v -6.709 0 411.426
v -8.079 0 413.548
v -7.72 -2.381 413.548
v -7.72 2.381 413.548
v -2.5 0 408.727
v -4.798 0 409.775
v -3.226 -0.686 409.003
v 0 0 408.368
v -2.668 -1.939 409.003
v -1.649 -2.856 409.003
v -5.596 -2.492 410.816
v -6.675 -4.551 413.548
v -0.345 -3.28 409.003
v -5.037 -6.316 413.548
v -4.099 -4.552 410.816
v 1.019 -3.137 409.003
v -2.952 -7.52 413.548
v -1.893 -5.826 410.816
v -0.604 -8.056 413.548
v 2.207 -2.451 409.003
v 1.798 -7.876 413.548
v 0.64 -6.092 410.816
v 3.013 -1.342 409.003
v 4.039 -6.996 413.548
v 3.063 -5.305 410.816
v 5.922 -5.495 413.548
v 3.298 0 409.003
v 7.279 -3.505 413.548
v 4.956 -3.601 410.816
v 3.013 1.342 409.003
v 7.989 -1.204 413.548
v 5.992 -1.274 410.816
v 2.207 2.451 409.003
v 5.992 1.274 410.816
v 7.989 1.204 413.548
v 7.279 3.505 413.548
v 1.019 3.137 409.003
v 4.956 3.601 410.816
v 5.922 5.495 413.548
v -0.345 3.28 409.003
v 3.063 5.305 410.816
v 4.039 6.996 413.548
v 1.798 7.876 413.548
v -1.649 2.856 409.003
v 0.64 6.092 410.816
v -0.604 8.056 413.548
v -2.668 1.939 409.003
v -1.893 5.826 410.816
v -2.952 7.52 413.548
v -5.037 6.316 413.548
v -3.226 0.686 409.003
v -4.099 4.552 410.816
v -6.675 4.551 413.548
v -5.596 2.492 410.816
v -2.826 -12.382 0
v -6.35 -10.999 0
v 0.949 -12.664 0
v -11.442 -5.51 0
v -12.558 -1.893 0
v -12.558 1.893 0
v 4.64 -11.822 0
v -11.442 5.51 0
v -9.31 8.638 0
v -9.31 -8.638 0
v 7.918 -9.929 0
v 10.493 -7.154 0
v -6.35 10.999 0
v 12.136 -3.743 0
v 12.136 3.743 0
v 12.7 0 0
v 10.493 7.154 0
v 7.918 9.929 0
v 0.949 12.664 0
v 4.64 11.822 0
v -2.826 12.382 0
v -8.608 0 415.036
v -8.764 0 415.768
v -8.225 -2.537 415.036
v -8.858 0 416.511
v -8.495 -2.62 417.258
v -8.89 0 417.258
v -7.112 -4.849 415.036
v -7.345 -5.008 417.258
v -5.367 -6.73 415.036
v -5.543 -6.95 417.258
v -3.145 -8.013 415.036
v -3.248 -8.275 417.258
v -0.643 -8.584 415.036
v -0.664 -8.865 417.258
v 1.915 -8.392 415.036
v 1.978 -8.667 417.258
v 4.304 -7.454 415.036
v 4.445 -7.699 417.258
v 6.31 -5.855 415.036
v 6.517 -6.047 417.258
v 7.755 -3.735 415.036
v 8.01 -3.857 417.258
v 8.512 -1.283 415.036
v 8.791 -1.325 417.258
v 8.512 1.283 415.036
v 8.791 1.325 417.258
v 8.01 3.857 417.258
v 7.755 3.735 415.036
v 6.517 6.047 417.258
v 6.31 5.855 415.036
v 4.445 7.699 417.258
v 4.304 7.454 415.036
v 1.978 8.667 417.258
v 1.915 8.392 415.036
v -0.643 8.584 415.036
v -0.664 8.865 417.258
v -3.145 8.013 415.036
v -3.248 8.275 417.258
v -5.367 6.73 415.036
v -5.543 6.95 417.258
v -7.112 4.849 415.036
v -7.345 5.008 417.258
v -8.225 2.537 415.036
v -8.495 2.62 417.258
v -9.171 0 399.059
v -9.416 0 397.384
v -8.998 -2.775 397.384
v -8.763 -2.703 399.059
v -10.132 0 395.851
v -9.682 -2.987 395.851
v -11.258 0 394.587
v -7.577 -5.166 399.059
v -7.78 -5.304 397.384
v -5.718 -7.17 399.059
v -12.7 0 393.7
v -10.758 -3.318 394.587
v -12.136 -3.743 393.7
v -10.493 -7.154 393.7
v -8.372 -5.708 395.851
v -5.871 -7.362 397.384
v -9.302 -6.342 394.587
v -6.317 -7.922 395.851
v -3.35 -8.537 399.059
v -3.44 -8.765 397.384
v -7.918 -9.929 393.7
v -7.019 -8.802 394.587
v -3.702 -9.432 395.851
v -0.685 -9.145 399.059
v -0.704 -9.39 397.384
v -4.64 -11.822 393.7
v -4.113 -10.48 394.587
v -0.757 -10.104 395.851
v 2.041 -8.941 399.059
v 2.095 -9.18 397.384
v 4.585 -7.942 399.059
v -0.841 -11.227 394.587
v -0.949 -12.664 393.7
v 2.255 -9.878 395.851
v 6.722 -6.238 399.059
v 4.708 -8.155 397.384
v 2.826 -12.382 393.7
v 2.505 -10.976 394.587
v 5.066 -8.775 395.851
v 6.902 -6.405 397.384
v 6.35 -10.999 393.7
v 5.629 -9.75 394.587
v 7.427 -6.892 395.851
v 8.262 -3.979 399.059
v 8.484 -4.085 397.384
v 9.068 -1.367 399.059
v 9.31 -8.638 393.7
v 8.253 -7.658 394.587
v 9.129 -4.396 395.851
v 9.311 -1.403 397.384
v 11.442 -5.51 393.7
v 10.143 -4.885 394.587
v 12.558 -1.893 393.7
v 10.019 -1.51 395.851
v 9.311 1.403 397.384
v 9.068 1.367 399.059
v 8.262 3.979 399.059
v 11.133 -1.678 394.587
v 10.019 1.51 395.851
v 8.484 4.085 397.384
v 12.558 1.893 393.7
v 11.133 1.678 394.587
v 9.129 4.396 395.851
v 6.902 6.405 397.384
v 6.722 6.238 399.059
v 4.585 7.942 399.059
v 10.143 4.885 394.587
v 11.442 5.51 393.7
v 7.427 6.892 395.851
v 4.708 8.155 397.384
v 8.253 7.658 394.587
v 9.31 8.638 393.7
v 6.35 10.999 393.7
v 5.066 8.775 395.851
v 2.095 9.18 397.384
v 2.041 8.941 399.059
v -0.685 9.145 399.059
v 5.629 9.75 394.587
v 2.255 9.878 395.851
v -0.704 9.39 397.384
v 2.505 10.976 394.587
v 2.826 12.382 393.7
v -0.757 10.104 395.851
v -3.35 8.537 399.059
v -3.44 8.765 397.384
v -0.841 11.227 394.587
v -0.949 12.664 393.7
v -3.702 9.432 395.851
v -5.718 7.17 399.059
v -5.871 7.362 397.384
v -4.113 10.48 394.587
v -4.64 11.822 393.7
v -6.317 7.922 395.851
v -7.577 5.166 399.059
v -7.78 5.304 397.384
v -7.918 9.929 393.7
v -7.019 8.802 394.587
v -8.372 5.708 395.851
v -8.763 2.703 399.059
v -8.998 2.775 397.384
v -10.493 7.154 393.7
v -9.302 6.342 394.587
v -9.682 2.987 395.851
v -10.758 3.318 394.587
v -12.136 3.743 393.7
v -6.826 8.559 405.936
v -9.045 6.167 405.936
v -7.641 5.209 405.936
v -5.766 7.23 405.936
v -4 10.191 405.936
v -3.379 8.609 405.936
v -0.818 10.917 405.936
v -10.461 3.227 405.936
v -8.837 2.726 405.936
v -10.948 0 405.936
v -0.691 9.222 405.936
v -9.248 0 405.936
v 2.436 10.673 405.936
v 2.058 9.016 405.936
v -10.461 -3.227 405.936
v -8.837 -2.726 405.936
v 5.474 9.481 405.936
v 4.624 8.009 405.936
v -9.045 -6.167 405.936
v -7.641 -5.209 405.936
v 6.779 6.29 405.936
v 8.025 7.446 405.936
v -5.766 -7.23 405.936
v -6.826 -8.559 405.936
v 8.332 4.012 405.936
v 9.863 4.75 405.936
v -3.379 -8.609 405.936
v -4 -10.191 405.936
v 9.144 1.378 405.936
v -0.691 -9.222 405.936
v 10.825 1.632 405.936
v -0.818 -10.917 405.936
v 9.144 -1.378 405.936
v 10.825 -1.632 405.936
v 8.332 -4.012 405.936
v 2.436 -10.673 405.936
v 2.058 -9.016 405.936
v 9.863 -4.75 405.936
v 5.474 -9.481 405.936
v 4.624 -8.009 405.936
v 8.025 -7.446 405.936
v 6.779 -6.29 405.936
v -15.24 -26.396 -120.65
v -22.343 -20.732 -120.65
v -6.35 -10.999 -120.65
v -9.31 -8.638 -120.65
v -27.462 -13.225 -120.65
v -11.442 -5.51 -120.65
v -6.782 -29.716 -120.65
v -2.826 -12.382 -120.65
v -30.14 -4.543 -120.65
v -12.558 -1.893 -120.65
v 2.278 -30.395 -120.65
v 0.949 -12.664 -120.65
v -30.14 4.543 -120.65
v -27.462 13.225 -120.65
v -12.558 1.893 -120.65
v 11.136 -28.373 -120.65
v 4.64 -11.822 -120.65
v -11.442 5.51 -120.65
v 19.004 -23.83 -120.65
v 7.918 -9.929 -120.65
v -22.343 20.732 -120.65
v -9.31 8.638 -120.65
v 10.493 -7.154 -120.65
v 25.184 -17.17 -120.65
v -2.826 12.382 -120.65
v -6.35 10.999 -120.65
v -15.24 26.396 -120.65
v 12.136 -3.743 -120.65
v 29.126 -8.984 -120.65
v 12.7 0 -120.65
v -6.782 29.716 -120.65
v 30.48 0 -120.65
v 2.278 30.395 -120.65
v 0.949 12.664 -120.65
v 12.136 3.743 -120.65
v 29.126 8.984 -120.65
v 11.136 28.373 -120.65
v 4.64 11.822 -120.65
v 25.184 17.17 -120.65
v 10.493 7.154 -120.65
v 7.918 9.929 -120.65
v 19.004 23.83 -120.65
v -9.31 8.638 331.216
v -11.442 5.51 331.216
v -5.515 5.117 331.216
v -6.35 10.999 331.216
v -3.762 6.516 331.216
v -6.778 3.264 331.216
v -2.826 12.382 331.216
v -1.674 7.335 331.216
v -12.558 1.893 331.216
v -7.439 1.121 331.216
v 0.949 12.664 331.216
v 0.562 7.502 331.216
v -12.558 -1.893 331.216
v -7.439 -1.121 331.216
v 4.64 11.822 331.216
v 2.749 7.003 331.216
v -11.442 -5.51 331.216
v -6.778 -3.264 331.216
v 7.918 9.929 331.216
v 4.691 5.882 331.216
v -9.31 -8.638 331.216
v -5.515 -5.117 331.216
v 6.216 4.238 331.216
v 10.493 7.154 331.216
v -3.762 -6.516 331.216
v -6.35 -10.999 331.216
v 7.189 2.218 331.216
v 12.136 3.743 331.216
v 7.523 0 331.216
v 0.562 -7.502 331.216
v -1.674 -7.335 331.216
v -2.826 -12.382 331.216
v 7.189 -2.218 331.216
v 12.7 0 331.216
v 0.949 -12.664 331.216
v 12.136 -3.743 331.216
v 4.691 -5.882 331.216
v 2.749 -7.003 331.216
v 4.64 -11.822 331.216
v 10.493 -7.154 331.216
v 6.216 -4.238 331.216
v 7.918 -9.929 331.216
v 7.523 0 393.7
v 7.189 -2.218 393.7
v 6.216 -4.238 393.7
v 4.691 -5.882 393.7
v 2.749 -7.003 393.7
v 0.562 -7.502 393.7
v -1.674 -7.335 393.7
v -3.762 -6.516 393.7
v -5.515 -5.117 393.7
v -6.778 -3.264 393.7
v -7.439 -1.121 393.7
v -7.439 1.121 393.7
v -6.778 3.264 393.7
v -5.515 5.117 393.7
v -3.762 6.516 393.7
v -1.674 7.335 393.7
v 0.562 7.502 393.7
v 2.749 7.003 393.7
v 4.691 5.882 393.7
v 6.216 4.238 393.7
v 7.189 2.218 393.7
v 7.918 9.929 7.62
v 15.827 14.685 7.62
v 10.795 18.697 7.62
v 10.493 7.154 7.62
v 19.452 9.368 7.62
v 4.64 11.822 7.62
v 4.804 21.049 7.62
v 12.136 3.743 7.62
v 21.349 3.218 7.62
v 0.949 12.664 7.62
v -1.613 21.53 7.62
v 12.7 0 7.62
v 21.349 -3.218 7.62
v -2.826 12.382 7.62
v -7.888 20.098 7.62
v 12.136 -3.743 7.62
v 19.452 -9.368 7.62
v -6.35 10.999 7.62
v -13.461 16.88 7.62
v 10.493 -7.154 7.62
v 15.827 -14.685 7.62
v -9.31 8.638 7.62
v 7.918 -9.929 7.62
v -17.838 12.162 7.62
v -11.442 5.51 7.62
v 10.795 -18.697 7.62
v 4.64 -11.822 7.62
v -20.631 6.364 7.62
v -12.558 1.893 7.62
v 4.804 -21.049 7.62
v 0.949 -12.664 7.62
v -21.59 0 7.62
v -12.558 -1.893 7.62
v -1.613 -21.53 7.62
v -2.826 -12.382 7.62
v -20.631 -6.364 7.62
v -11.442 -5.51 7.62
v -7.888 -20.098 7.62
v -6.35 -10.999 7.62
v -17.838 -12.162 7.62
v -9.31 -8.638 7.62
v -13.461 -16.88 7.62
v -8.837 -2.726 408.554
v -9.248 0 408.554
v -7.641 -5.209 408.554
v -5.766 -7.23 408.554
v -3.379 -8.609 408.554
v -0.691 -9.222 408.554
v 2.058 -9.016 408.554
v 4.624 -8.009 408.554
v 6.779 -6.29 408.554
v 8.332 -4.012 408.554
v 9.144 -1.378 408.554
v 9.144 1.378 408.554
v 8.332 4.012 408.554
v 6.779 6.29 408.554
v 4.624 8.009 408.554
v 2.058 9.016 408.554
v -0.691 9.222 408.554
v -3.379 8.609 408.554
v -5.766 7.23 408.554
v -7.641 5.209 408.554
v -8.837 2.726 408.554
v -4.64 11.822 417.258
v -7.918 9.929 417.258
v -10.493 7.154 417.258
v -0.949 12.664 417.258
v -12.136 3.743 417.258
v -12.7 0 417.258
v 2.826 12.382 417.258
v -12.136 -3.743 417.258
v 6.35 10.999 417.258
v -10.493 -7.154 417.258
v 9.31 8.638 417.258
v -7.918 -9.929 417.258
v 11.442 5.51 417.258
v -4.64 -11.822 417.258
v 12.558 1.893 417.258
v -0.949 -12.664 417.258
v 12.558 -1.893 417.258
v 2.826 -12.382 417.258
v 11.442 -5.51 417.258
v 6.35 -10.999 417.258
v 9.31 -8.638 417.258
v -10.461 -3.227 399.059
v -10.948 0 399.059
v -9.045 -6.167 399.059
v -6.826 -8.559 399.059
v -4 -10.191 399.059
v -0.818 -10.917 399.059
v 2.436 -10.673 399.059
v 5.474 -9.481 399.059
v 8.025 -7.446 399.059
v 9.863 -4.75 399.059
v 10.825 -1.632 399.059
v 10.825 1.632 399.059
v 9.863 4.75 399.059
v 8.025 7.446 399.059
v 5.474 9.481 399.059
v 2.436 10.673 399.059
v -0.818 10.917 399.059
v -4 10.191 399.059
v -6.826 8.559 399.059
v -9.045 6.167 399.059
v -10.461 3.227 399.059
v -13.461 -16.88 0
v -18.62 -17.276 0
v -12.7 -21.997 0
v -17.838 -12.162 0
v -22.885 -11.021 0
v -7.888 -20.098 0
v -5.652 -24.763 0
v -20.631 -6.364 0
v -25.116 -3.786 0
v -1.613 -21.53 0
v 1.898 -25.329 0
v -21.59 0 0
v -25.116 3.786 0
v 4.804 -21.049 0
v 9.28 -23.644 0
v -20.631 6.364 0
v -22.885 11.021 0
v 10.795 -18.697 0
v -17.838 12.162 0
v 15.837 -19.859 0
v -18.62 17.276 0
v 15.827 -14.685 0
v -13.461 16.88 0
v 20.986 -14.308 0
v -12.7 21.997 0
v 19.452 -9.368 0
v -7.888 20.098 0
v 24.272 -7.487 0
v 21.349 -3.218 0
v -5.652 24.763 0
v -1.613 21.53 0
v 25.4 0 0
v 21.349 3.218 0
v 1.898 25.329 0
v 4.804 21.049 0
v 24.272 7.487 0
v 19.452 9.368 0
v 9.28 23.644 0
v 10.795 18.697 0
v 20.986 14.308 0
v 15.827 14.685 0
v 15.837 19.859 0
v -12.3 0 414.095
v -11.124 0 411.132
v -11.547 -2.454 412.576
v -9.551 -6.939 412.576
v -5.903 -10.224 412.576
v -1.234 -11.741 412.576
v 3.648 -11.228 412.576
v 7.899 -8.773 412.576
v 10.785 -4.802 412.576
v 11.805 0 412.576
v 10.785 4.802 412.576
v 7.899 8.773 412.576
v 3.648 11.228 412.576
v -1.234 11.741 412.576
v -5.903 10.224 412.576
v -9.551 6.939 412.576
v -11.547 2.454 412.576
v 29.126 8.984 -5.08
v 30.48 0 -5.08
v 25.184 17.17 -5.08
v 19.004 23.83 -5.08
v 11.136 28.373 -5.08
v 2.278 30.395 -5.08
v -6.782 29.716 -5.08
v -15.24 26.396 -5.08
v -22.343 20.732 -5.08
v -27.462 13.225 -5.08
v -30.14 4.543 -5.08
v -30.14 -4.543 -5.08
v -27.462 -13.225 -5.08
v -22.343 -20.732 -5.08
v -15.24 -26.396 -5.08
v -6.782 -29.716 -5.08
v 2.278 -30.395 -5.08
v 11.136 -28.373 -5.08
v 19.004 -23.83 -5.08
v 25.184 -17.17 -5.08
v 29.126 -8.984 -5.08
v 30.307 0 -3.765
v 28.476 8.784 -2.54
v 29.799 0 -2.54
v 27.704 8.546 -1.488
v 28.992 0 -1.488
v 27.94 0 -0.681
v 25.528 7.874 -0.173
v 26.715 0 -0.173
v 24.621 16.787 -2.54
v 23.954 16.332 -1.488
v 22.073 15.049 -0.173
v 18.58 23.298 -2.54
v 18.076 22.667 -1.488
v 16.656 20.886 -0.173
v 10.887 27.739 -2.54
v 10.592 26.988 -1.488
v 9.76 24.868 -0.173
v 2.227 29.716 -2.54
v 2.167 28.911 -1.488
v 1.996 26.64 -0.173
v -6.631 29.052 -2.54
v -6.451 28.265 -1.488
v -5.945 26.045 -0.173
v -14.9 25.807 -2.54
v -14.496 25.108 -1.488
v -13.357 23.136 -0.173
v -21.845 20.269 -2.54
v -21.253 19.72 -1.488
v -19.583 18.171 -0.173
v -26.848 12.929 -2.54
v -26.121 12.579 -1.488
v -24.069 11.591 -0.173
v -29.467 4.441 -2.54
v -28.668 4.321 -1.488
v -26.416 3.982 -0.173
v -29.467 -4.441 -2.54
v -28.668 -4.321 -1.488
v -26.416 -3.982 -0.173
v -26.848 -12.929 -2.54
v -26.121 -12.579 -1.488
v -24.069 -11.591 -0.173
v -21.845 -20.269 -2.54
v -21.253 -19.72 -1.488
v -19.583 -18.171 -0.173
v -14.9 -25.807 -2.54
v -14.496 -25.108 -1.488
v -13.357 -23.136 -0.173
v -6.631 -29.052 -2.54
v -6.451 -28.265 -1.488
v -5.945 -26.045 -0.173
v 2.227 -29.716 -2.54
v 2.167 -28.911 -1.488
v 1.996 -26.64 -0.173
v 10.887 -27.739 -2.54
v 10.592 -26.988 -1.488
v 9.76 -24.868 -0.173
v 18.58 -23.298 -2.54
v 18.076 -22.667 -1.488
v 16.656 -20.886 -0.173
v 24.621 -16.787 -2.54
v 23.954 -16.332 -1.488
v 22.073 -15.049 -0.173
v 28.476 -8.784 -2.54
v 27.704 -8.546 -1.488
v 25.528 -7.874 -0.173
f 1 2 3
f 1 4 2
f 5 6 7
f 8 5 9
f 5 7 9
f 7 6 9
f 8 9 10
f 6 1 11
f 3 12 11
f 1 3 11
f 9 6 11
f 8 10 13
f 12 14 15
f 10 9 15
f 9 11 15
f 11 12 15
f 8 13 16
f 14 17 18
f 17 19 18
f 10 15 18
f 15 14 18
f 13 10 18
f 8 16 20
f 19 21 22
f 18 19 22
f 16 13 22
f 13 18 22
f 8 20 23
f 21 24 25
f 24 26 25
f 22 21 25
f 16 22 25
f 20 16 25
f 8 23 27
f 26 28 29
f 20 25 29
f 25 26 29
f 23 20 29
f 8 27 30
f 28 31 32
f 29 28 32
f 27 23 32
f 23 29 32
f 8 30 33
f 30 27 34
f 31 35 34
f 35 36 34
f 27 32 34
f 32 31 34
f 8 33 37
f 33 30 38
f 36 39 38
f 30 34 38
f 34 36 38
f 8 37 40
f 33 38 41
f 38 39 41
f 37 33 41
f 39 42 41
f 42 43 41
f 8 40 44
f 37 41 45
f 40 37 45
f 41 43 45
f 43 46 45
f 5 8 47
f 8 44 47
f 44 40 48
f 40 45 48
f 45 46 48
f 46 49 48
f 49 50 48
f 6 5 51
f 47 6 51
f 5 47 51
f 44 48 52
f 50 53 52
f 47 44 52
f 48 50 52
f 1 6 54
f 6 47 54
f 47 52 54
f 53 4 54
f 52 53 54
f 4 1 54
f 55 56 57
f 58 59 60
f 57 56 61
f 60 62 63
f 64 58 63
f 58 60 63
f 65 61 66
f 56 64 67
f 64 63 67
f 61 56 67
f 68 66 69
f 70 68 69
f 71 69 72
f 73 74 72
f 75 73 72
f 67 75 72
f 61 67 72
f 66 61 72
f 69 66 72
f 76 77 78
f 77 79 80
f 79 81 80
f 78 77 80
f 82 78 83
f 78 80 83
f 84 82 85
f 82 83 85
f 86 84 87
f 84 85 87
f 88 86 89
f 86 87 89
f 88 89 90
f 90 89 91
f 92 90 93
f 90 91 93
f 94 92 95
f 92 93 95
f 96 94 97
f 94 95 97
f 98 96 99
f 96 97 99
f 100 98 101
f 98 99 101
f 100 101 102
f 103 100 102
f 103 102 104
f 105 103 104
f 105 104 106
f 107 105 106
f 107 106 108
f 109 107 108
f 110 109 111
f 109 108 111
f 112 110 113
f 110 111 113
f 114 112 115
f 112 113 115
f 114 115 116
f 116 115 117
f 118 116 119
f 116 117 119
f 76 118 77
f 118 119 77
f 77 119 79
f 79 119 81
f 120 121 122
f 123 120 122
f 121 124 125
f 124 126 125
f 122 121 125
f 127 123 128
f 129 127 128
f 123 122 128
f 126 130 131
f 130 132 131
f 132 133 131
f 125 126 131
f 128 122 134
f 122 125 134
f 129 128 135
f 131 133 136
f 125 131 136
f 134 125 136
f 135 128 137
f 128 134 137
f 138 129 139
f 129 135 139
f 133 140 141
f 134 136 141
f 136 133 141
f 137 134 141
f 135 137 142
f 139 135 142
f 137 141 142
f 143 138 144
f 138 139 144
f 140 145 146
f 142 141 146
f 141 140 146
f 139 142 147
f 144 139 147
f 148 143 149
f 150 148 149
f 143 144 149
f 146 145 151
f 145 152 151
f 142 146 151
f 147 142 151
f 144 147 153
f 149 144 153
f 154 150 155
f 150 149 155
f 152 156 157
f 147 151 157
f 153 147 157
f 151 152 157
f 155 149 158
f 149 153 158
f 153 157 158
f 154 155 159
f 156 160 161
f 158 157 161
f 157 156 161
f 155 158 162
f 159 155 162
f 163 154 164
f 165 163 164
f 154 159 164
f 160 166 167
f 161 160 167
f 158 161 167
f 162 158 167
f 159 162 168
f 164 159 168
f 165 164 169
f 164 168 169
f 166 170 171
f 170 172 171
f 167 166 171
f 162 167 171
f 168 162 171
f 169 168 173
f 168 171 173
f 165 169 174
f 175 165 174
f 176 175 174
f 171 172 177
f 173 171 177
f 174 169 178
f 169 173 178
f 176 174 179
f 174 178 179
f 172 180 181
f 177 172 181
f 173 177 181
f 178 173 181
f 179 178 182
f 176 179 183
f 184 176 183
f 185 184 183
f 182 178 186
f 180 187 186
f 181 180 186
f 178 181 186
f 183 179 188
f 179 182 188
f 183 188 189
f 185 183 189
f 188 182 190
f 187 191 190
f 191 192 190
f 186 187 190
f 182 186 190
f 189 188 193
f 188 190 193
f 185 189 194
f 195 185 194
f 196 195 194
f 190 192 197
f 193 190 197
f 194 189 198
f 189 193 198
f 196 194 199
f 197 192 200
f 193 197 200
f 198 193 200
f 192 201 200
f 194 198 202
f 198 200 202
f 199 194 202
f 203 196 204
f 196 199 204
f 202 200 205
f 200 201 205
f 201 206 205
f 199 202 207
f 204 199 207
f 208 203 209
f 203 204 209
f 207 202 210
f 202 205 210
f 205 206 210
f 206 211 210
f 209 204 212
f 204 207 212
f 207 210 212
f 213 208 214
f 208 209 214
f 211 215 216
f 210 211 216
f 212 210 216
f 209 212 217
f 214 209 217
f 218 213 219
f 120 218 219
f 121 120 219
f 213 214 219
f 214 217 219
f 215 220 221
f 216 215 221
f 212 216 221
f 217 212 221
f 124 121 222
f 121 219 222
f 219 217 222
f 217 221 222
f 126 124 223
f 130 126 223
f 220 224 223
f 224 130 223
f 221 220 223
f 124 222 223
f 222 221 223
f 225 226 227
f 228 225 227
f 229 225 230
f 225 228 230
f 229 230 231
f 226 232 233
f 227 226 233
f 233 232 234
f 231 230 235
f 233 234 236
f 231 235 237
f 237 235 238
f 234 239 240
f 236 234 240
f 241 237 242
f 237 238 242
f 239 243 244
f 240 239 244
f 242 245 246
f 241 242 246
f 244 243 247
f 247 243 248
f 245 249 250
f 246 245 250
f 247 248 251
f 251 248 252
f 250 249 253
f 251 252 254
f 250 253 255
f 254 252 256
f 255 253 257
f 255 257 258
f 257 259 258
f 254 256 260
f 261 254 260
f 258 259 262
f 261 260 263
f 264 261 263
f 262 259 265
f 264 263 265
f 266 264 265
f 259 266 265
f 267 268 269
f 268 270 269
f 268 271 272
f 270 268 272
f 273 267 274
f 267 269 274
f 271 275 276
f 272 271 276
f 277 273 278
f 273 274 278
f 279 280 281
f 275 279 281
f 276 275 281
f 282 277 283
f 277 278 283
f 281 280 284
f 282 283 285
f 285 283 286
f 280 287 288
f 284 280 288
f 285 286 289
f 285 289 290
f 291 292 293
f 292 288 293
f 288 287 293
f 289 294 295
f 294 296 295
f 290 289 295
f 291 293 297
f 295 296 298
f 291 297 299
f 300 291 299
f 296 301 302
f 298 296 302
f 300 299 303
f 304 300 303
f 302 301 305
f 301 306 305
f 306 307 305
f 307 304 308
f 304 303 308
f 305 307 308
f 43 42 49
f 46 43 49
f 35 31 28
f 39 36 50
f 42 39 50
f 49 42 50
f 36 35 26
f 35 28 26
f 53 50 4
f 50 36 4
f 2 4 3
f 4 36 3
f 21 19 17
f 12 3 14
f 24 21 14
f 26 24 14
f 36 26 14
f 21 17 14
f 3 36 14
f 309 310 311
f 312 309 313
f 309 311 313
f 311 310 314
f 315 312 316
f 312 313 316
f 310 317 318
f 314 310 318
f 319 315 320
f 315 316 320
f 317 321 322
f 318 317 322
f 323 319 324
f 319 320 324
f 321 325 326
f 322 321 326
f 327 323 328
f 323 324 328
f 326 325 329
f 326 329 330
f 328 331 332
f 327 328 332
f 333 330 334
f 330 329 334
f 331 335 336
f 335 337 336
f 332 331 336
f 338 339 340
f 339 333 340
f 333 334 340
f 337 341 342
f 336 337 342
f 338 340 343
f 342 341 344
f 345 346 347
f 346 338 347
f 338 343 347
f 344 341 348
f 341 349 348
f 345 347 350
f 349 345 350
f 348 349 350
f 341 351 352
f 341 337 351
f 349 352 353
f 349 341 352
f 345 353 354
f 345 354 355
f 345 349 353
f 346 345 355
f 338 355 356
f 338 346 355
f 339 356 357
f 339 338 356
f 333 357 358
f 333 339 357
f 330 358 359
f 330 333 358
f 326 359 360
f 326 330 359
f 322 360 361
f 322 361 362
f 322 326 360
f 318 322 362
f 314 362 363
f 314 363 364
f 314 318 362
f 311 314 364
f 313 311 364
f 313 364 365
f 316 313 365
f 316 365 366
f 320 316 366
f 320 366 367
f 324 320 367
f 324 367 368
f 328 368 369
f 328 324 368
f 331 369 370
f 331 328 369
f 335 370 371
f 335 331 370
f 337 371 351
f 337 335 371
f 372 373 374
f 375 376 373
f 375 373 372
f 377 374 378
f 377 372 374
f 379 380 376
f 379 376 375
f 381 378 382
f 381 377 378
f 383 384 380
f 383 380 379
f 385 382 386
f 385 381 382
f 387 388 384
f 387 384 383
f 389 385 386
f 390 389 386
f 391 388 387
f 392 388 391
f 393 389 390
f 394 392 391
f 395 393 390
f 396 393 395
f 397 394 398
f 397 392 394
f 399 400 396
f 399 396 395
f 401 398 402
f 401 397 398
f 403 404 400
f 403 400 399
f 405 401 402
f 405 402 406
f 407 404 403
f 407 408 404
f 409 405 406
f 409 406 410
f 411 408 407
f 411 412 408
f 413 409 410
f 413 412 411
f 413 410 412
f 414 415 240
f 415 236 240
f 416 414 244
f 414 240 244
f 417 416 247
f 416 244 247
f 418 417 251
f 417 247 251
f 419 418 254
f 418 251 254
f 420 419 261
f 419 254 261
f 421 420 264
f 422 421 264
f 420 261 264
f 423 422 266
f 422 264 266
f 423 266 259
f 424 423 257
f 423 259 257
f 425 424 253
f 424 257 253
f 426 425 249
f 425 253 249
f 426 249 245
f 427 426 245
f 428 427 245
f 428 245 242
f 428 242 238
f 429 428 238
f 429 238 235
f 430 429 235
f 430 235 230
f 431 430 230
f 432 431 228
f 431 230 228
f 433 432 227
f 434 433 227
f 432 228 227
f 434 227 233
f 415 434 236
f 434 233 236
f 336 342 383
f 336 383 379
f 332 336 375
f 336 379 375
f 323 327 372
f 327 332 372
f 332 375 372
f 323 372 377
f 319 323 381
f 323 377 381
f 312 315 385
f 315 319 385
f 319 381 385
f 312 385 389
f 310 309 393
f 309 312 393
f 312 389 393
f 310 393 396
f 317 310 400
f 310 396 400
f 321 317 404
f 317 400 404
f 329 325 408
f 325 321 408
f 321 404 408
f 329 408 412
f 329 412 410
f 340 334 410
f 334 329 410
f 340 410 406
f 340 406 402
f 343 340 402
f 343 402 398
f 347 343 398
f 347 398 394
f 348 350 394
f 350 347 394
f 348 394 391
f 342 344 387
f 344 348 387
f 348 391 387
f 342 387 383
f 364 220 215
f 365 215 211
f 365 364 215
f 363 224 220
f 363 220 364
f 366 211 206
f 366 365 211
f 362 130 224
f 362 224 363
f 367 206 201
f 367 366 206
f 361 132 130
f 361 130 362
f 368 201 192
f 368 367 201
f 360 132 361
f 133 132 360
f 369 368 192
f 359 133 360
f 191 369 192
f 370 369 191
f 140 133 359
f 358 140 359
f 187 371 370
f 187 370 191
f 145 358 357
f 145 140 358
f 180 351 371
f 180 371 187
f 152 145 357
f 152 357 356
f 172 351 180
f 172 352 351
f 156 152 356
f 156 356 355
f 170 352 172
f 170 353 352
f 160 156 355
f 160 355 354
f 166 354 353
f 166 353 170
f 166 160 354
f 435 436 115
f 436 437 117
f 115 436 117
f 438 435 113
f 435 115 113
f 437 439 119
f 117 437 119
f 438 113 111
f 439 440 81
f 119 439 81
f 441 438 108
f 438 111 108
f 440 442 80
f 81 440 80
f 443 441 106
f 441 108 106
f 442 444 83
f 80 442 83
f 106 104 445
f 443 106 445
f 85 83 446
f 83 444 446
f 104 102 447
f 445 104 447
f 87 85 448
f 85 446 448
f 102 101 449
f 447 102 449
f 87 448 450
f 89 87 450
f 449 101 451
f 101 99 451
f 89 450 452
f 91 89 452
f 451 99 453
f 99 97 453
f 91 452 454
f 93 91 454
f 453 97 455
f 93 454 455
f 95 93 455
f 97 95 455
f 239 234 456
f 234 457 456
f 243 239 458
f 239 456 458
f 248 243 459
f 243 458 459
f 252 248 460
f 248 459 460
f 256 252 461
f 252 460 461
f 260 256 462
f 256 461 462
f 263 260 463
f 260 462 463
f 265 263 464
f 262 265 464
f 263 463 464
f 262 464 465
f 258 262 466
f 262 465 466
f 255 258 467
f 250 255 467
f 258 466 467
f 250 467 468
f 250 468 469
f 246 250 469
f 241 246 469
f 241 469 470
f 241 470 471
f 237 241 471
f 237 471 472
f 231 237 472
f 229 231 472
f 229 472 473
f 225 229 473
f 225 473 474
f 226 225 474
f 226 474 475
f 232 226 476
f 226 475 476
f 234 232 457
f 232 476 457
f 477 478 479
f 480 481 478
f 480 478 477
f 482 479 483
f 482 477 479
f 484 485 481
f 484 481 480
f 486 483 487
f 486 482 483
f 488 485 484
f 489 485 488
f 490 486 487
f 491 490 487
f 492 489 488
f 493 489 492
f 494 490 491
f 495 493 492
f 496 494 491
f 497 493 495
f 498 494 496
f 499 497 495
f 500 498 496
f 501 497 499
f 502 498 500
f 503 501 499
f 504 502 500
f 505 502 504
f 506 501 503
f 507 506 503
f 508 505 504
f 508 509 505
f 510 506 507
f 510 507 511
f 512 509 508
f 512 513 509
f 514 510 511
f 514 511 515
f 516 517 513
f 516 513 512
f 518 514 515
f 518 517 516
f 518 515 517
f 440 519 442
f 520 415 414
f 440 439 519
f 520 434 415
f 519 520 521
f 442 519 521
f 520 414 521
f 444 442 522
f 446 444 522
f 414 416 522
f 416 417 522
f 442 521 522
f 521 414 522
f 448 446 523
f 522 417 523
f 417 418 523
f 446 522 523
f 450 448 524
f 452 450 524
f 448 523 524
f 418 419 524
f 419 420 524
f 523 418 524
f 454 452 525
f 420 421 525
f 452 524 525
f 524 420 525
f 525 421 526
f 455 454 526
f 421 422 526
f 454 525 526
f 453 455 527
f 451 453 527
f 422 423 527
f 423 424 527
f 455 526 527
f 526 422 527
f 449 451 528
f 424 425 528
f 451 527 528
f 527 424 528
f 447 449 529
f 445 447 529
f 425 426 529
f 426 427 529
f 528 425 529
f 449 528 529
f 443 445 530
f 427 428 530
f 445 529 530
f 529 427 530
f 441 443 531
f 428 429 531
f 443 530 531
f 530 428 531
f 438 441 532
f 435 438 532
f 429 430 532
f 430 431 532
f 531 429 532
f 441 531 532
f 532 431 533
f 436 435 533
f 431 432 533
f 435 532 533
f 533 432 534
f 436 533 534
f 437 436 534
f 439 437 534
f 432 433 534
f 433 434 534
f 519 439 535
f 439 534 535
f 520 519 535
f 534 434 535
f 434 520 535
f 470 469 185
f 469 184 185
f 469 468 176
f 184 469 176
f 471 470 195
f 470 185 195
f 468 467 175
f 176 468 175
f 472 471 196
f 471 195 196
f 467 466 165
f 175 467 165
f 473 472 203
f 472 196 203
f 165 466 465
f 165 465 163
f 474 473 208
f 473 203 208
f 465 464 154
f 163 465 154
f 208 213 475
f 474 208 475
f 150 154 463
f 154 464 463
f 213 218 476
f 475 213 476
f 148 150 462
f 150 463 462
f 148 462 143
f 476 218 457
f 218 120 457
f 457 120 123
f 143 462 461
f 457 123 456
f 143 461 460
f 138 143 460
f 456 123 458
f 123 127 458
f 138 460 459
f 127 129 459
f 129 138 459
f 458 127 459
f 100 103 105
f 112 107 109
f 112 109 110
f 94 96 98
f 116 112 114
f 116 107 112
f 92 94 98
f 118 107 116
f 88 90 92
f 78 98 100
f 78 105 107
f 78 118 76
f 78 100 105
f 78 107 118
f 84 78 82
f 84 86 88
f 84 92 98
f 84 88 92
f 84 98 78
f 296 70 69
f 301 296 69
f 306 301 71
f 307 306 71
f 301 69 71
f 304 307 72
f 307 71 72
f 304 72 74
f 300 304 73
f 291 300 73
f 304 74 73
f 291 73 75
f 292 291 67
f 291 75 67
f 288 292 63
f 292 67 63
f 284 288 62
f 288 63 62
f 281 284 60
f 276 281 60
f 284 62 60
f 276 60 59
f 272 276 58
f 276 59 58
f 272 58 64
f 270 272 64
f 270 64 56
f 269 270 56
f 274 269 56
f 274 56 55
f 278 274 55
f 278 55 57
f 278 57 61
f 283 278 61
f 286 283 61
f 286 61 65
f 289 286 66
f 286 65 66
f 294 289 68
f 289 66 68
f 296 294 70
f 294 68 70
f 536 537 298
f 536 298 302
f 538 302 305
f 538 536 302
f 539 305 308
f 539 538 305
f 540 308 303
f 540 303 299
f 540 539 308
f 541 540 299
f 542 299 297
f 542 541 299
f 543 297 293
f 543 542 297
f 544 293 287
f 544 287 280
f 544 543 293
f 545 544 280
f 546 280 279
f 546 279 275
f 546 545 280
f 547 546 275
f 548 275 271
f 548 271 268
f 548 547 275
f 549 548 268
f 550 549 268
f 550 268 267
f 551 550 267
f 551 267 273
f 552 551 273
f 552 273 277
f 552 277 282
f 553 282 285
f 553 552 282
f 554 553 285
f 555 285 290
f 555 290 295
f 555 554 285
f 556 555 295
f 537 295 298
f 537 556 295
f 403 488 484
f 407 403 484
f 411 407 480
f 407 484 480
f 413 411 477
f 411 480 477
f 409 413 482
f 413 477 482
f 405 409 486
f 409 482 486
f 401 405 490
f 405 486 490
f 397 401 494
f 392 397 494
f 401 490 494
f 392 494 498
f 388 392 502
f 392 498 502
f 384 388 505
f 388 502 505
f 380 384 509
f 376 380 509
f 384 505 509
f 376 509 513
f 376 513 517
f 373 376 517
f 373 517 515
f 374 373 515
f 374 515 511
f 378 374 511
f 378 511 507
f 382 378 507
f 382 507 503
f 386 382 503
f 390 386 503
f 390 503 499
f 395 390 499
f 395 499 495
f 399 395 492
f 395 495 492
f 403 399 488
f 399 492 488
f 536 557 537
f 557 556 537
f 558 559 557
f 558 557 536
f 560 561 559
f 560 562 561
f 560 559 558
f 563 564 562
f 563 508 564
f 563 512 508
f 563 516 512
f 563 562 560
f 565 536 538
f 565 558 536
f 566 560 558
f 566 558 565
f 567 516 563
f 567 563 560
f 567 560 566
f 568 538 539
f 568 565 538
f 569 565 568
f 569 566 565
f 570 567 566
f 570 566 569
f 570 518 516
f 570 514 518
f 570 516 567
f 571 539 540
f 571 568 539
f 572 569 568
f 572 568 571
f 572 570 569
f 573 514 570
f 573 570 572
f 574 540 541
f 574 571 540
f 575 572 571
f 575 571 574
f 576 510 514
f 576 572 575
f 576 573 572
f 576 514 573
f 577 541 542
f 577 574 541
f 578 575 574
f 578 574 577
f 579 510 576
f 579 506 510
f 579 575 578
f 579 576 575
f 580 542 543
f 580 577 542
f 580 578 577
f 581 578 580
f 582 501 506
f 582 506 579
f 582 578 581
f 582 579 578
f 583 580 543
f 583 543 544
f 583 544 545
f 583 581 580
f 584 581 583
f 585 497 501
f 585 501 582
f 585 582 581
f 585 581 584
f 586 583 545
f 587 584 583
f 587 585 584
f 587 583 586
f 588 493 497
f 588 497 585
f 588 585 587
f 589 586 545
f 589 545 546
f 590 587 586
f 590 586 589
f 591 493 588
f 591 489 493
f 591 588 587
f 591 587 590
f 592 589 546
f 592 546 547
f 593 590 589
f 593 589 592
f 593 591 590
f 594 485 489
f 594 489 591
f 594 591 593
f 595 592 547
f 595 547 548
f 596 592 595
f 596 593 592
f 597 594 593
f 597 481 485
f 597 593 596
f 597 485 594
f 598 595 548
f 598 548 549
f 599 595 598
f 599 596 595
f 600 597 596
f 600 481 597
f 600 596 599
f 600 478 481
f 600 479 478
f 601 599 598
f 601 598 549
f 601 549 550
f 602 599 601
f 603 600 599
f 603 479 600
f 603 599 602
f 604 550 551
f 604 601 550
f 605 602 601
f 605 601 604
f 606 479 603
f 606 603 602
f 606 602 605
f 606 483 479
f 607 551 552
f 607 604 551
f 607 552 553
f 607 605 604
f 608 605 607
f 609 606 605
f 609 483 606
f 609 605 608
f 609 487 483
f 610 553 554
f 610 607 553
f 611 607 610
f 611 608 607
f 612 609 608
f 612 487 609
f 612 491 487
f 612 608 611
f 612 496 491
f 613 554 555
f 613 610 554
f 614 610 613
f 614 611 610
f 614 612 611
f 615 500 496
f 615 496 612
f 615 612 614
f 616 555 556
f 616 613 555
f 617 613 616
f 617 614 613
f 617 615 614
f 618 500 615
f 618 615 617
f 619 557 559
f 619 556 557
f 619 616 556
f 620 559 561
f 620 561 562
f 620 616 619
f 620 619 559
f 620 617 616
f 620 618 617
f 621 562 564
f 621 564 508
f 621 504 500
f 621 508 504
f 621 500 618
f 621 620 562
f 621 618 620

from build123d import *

# Parameters (mm, degrees)
SKETCH1_R           = 12.7
BOSS_EXTRUDE1_DEPTH = 393.7
SKETCH1_3_R         = 30.48
SKETCH1_3_R_2       = 12.7
BOSS_EXTRUDE2_DEPTH = 120.65
FILLET1_R           = 5.08
SKETCH2_R           = 21.59
BOSS_EXTRUDE3_DEPTH = 7.62
SKETCH4_W           = 11.455449348
SKETCH4_H           = 1.487714446
SKETCH5_W           = 19.408085654
SKETCH5_H           = 62.484


with BuildPart() as part:
    # Sketch1 → Boss-Extrude1 (new body)
    with BuildSketch(Plane.XY):
        Circle(SKETCH1_R)
    extrude(amount=BOSS_EXTRUDE1_DEPTH)



with BuildPart() as body_2:
    # Sketch1<3> → Boss-Extrude2 (new body)
    with BuildSketch(Plane.XY):
        Circle(SKETCH1_3_R)
        Circle(SKETCH1_3_R_2, mode=Mode.SUBTRACT)
    extrude(amount=-BOSS_EXTRUDE2_DEPTH)

    # Fillet1
    fillet1_edges = [body_2.edges().sort_by_distance(p)[0] for p in [
        (-30.48, 0, 0),
    ]]
    fillet(fillet1_edges, radius=FILLET1_R)


with BuildPart() as part_1:
    add(part.part)

    add(body_2.part)  # Boss-Extrude3 merges body 2
    # Sketch2 → Boss-Extrude3 (add)
    with BuildSketch(Plane.XY):
        Circle(SKETCH2_R)
    extrude(amount=BOSS_EXTRUDE3_DEPTH)

    # Sketch3 → Revolve2 (revolve)
    with BuildSketch(Plane(origin=(0, 0, 0), x_dir=(1, 0, 0), z_dir=(0, 1, 0))):
        with BuildLine():
            Line((12.7, -393.7), (0, -393.7))
            Line((0, -393.7), (0, -408.3685))
            ThreePointArc((0, -408.3685), (6.286179285, -410.972320715), (8.89, -417.2585))
            Line((8.89, -417.2585), (12.7, -417.2585))
            ThreePointArc((12.7, -417.2585), (11.805440428, -412.576451698), (9.247783259, -408.5539894))
            Line((9.247783259, -408.5539894), (9.247783259, -405.935541368))
            Line((9.247783259, -405.935541368), (10.947551139, -405.935541368))
            Line((10.947551139, -405.935541368), (10.947551139, -399.059207672))
            Line((10.947551139, -399.059207672), (9.170521083, -399.059207672))
            ThreePointArc((9.170521083, -399.059207672), (10.132151594, -395.850690557), (12.7, -393.7))
        make_face()
    revolve(axis=Axis((0, 0, 393.7), (0, 0, 1)))

    # Sketch4 → Revolve3 (revolve)
    with BuildSketch(Plane(origin=(0, 0, 0), x_dir=(1, 0, 0), z_dir=(0, 1, 0))):
        with Locations((-5.727724674, -414.292142777)):
            Rectangle(SKETCH4_W, SKETCH4_H)
    revolve(axis=Axis((0, 0, 393.7), (0, 0, 1)))

    # Sketch5 → Cut-Revolve1 (revolve, cut)
    with BuildSketch(Plane(origin=(0, 0, 0), x_dir=(1, 0, 0), z_dir=(0, 1, 0))):
        with Locations((-17.227522827, -362.458)):
            Rectangle(SKETCH5_W, SKETCH5_H)
    revolve(axis=Axis((0, 0, 417.2585), (0, 0, -1)), mode=Mode.SUBTRACT)


solid = part_1.part
